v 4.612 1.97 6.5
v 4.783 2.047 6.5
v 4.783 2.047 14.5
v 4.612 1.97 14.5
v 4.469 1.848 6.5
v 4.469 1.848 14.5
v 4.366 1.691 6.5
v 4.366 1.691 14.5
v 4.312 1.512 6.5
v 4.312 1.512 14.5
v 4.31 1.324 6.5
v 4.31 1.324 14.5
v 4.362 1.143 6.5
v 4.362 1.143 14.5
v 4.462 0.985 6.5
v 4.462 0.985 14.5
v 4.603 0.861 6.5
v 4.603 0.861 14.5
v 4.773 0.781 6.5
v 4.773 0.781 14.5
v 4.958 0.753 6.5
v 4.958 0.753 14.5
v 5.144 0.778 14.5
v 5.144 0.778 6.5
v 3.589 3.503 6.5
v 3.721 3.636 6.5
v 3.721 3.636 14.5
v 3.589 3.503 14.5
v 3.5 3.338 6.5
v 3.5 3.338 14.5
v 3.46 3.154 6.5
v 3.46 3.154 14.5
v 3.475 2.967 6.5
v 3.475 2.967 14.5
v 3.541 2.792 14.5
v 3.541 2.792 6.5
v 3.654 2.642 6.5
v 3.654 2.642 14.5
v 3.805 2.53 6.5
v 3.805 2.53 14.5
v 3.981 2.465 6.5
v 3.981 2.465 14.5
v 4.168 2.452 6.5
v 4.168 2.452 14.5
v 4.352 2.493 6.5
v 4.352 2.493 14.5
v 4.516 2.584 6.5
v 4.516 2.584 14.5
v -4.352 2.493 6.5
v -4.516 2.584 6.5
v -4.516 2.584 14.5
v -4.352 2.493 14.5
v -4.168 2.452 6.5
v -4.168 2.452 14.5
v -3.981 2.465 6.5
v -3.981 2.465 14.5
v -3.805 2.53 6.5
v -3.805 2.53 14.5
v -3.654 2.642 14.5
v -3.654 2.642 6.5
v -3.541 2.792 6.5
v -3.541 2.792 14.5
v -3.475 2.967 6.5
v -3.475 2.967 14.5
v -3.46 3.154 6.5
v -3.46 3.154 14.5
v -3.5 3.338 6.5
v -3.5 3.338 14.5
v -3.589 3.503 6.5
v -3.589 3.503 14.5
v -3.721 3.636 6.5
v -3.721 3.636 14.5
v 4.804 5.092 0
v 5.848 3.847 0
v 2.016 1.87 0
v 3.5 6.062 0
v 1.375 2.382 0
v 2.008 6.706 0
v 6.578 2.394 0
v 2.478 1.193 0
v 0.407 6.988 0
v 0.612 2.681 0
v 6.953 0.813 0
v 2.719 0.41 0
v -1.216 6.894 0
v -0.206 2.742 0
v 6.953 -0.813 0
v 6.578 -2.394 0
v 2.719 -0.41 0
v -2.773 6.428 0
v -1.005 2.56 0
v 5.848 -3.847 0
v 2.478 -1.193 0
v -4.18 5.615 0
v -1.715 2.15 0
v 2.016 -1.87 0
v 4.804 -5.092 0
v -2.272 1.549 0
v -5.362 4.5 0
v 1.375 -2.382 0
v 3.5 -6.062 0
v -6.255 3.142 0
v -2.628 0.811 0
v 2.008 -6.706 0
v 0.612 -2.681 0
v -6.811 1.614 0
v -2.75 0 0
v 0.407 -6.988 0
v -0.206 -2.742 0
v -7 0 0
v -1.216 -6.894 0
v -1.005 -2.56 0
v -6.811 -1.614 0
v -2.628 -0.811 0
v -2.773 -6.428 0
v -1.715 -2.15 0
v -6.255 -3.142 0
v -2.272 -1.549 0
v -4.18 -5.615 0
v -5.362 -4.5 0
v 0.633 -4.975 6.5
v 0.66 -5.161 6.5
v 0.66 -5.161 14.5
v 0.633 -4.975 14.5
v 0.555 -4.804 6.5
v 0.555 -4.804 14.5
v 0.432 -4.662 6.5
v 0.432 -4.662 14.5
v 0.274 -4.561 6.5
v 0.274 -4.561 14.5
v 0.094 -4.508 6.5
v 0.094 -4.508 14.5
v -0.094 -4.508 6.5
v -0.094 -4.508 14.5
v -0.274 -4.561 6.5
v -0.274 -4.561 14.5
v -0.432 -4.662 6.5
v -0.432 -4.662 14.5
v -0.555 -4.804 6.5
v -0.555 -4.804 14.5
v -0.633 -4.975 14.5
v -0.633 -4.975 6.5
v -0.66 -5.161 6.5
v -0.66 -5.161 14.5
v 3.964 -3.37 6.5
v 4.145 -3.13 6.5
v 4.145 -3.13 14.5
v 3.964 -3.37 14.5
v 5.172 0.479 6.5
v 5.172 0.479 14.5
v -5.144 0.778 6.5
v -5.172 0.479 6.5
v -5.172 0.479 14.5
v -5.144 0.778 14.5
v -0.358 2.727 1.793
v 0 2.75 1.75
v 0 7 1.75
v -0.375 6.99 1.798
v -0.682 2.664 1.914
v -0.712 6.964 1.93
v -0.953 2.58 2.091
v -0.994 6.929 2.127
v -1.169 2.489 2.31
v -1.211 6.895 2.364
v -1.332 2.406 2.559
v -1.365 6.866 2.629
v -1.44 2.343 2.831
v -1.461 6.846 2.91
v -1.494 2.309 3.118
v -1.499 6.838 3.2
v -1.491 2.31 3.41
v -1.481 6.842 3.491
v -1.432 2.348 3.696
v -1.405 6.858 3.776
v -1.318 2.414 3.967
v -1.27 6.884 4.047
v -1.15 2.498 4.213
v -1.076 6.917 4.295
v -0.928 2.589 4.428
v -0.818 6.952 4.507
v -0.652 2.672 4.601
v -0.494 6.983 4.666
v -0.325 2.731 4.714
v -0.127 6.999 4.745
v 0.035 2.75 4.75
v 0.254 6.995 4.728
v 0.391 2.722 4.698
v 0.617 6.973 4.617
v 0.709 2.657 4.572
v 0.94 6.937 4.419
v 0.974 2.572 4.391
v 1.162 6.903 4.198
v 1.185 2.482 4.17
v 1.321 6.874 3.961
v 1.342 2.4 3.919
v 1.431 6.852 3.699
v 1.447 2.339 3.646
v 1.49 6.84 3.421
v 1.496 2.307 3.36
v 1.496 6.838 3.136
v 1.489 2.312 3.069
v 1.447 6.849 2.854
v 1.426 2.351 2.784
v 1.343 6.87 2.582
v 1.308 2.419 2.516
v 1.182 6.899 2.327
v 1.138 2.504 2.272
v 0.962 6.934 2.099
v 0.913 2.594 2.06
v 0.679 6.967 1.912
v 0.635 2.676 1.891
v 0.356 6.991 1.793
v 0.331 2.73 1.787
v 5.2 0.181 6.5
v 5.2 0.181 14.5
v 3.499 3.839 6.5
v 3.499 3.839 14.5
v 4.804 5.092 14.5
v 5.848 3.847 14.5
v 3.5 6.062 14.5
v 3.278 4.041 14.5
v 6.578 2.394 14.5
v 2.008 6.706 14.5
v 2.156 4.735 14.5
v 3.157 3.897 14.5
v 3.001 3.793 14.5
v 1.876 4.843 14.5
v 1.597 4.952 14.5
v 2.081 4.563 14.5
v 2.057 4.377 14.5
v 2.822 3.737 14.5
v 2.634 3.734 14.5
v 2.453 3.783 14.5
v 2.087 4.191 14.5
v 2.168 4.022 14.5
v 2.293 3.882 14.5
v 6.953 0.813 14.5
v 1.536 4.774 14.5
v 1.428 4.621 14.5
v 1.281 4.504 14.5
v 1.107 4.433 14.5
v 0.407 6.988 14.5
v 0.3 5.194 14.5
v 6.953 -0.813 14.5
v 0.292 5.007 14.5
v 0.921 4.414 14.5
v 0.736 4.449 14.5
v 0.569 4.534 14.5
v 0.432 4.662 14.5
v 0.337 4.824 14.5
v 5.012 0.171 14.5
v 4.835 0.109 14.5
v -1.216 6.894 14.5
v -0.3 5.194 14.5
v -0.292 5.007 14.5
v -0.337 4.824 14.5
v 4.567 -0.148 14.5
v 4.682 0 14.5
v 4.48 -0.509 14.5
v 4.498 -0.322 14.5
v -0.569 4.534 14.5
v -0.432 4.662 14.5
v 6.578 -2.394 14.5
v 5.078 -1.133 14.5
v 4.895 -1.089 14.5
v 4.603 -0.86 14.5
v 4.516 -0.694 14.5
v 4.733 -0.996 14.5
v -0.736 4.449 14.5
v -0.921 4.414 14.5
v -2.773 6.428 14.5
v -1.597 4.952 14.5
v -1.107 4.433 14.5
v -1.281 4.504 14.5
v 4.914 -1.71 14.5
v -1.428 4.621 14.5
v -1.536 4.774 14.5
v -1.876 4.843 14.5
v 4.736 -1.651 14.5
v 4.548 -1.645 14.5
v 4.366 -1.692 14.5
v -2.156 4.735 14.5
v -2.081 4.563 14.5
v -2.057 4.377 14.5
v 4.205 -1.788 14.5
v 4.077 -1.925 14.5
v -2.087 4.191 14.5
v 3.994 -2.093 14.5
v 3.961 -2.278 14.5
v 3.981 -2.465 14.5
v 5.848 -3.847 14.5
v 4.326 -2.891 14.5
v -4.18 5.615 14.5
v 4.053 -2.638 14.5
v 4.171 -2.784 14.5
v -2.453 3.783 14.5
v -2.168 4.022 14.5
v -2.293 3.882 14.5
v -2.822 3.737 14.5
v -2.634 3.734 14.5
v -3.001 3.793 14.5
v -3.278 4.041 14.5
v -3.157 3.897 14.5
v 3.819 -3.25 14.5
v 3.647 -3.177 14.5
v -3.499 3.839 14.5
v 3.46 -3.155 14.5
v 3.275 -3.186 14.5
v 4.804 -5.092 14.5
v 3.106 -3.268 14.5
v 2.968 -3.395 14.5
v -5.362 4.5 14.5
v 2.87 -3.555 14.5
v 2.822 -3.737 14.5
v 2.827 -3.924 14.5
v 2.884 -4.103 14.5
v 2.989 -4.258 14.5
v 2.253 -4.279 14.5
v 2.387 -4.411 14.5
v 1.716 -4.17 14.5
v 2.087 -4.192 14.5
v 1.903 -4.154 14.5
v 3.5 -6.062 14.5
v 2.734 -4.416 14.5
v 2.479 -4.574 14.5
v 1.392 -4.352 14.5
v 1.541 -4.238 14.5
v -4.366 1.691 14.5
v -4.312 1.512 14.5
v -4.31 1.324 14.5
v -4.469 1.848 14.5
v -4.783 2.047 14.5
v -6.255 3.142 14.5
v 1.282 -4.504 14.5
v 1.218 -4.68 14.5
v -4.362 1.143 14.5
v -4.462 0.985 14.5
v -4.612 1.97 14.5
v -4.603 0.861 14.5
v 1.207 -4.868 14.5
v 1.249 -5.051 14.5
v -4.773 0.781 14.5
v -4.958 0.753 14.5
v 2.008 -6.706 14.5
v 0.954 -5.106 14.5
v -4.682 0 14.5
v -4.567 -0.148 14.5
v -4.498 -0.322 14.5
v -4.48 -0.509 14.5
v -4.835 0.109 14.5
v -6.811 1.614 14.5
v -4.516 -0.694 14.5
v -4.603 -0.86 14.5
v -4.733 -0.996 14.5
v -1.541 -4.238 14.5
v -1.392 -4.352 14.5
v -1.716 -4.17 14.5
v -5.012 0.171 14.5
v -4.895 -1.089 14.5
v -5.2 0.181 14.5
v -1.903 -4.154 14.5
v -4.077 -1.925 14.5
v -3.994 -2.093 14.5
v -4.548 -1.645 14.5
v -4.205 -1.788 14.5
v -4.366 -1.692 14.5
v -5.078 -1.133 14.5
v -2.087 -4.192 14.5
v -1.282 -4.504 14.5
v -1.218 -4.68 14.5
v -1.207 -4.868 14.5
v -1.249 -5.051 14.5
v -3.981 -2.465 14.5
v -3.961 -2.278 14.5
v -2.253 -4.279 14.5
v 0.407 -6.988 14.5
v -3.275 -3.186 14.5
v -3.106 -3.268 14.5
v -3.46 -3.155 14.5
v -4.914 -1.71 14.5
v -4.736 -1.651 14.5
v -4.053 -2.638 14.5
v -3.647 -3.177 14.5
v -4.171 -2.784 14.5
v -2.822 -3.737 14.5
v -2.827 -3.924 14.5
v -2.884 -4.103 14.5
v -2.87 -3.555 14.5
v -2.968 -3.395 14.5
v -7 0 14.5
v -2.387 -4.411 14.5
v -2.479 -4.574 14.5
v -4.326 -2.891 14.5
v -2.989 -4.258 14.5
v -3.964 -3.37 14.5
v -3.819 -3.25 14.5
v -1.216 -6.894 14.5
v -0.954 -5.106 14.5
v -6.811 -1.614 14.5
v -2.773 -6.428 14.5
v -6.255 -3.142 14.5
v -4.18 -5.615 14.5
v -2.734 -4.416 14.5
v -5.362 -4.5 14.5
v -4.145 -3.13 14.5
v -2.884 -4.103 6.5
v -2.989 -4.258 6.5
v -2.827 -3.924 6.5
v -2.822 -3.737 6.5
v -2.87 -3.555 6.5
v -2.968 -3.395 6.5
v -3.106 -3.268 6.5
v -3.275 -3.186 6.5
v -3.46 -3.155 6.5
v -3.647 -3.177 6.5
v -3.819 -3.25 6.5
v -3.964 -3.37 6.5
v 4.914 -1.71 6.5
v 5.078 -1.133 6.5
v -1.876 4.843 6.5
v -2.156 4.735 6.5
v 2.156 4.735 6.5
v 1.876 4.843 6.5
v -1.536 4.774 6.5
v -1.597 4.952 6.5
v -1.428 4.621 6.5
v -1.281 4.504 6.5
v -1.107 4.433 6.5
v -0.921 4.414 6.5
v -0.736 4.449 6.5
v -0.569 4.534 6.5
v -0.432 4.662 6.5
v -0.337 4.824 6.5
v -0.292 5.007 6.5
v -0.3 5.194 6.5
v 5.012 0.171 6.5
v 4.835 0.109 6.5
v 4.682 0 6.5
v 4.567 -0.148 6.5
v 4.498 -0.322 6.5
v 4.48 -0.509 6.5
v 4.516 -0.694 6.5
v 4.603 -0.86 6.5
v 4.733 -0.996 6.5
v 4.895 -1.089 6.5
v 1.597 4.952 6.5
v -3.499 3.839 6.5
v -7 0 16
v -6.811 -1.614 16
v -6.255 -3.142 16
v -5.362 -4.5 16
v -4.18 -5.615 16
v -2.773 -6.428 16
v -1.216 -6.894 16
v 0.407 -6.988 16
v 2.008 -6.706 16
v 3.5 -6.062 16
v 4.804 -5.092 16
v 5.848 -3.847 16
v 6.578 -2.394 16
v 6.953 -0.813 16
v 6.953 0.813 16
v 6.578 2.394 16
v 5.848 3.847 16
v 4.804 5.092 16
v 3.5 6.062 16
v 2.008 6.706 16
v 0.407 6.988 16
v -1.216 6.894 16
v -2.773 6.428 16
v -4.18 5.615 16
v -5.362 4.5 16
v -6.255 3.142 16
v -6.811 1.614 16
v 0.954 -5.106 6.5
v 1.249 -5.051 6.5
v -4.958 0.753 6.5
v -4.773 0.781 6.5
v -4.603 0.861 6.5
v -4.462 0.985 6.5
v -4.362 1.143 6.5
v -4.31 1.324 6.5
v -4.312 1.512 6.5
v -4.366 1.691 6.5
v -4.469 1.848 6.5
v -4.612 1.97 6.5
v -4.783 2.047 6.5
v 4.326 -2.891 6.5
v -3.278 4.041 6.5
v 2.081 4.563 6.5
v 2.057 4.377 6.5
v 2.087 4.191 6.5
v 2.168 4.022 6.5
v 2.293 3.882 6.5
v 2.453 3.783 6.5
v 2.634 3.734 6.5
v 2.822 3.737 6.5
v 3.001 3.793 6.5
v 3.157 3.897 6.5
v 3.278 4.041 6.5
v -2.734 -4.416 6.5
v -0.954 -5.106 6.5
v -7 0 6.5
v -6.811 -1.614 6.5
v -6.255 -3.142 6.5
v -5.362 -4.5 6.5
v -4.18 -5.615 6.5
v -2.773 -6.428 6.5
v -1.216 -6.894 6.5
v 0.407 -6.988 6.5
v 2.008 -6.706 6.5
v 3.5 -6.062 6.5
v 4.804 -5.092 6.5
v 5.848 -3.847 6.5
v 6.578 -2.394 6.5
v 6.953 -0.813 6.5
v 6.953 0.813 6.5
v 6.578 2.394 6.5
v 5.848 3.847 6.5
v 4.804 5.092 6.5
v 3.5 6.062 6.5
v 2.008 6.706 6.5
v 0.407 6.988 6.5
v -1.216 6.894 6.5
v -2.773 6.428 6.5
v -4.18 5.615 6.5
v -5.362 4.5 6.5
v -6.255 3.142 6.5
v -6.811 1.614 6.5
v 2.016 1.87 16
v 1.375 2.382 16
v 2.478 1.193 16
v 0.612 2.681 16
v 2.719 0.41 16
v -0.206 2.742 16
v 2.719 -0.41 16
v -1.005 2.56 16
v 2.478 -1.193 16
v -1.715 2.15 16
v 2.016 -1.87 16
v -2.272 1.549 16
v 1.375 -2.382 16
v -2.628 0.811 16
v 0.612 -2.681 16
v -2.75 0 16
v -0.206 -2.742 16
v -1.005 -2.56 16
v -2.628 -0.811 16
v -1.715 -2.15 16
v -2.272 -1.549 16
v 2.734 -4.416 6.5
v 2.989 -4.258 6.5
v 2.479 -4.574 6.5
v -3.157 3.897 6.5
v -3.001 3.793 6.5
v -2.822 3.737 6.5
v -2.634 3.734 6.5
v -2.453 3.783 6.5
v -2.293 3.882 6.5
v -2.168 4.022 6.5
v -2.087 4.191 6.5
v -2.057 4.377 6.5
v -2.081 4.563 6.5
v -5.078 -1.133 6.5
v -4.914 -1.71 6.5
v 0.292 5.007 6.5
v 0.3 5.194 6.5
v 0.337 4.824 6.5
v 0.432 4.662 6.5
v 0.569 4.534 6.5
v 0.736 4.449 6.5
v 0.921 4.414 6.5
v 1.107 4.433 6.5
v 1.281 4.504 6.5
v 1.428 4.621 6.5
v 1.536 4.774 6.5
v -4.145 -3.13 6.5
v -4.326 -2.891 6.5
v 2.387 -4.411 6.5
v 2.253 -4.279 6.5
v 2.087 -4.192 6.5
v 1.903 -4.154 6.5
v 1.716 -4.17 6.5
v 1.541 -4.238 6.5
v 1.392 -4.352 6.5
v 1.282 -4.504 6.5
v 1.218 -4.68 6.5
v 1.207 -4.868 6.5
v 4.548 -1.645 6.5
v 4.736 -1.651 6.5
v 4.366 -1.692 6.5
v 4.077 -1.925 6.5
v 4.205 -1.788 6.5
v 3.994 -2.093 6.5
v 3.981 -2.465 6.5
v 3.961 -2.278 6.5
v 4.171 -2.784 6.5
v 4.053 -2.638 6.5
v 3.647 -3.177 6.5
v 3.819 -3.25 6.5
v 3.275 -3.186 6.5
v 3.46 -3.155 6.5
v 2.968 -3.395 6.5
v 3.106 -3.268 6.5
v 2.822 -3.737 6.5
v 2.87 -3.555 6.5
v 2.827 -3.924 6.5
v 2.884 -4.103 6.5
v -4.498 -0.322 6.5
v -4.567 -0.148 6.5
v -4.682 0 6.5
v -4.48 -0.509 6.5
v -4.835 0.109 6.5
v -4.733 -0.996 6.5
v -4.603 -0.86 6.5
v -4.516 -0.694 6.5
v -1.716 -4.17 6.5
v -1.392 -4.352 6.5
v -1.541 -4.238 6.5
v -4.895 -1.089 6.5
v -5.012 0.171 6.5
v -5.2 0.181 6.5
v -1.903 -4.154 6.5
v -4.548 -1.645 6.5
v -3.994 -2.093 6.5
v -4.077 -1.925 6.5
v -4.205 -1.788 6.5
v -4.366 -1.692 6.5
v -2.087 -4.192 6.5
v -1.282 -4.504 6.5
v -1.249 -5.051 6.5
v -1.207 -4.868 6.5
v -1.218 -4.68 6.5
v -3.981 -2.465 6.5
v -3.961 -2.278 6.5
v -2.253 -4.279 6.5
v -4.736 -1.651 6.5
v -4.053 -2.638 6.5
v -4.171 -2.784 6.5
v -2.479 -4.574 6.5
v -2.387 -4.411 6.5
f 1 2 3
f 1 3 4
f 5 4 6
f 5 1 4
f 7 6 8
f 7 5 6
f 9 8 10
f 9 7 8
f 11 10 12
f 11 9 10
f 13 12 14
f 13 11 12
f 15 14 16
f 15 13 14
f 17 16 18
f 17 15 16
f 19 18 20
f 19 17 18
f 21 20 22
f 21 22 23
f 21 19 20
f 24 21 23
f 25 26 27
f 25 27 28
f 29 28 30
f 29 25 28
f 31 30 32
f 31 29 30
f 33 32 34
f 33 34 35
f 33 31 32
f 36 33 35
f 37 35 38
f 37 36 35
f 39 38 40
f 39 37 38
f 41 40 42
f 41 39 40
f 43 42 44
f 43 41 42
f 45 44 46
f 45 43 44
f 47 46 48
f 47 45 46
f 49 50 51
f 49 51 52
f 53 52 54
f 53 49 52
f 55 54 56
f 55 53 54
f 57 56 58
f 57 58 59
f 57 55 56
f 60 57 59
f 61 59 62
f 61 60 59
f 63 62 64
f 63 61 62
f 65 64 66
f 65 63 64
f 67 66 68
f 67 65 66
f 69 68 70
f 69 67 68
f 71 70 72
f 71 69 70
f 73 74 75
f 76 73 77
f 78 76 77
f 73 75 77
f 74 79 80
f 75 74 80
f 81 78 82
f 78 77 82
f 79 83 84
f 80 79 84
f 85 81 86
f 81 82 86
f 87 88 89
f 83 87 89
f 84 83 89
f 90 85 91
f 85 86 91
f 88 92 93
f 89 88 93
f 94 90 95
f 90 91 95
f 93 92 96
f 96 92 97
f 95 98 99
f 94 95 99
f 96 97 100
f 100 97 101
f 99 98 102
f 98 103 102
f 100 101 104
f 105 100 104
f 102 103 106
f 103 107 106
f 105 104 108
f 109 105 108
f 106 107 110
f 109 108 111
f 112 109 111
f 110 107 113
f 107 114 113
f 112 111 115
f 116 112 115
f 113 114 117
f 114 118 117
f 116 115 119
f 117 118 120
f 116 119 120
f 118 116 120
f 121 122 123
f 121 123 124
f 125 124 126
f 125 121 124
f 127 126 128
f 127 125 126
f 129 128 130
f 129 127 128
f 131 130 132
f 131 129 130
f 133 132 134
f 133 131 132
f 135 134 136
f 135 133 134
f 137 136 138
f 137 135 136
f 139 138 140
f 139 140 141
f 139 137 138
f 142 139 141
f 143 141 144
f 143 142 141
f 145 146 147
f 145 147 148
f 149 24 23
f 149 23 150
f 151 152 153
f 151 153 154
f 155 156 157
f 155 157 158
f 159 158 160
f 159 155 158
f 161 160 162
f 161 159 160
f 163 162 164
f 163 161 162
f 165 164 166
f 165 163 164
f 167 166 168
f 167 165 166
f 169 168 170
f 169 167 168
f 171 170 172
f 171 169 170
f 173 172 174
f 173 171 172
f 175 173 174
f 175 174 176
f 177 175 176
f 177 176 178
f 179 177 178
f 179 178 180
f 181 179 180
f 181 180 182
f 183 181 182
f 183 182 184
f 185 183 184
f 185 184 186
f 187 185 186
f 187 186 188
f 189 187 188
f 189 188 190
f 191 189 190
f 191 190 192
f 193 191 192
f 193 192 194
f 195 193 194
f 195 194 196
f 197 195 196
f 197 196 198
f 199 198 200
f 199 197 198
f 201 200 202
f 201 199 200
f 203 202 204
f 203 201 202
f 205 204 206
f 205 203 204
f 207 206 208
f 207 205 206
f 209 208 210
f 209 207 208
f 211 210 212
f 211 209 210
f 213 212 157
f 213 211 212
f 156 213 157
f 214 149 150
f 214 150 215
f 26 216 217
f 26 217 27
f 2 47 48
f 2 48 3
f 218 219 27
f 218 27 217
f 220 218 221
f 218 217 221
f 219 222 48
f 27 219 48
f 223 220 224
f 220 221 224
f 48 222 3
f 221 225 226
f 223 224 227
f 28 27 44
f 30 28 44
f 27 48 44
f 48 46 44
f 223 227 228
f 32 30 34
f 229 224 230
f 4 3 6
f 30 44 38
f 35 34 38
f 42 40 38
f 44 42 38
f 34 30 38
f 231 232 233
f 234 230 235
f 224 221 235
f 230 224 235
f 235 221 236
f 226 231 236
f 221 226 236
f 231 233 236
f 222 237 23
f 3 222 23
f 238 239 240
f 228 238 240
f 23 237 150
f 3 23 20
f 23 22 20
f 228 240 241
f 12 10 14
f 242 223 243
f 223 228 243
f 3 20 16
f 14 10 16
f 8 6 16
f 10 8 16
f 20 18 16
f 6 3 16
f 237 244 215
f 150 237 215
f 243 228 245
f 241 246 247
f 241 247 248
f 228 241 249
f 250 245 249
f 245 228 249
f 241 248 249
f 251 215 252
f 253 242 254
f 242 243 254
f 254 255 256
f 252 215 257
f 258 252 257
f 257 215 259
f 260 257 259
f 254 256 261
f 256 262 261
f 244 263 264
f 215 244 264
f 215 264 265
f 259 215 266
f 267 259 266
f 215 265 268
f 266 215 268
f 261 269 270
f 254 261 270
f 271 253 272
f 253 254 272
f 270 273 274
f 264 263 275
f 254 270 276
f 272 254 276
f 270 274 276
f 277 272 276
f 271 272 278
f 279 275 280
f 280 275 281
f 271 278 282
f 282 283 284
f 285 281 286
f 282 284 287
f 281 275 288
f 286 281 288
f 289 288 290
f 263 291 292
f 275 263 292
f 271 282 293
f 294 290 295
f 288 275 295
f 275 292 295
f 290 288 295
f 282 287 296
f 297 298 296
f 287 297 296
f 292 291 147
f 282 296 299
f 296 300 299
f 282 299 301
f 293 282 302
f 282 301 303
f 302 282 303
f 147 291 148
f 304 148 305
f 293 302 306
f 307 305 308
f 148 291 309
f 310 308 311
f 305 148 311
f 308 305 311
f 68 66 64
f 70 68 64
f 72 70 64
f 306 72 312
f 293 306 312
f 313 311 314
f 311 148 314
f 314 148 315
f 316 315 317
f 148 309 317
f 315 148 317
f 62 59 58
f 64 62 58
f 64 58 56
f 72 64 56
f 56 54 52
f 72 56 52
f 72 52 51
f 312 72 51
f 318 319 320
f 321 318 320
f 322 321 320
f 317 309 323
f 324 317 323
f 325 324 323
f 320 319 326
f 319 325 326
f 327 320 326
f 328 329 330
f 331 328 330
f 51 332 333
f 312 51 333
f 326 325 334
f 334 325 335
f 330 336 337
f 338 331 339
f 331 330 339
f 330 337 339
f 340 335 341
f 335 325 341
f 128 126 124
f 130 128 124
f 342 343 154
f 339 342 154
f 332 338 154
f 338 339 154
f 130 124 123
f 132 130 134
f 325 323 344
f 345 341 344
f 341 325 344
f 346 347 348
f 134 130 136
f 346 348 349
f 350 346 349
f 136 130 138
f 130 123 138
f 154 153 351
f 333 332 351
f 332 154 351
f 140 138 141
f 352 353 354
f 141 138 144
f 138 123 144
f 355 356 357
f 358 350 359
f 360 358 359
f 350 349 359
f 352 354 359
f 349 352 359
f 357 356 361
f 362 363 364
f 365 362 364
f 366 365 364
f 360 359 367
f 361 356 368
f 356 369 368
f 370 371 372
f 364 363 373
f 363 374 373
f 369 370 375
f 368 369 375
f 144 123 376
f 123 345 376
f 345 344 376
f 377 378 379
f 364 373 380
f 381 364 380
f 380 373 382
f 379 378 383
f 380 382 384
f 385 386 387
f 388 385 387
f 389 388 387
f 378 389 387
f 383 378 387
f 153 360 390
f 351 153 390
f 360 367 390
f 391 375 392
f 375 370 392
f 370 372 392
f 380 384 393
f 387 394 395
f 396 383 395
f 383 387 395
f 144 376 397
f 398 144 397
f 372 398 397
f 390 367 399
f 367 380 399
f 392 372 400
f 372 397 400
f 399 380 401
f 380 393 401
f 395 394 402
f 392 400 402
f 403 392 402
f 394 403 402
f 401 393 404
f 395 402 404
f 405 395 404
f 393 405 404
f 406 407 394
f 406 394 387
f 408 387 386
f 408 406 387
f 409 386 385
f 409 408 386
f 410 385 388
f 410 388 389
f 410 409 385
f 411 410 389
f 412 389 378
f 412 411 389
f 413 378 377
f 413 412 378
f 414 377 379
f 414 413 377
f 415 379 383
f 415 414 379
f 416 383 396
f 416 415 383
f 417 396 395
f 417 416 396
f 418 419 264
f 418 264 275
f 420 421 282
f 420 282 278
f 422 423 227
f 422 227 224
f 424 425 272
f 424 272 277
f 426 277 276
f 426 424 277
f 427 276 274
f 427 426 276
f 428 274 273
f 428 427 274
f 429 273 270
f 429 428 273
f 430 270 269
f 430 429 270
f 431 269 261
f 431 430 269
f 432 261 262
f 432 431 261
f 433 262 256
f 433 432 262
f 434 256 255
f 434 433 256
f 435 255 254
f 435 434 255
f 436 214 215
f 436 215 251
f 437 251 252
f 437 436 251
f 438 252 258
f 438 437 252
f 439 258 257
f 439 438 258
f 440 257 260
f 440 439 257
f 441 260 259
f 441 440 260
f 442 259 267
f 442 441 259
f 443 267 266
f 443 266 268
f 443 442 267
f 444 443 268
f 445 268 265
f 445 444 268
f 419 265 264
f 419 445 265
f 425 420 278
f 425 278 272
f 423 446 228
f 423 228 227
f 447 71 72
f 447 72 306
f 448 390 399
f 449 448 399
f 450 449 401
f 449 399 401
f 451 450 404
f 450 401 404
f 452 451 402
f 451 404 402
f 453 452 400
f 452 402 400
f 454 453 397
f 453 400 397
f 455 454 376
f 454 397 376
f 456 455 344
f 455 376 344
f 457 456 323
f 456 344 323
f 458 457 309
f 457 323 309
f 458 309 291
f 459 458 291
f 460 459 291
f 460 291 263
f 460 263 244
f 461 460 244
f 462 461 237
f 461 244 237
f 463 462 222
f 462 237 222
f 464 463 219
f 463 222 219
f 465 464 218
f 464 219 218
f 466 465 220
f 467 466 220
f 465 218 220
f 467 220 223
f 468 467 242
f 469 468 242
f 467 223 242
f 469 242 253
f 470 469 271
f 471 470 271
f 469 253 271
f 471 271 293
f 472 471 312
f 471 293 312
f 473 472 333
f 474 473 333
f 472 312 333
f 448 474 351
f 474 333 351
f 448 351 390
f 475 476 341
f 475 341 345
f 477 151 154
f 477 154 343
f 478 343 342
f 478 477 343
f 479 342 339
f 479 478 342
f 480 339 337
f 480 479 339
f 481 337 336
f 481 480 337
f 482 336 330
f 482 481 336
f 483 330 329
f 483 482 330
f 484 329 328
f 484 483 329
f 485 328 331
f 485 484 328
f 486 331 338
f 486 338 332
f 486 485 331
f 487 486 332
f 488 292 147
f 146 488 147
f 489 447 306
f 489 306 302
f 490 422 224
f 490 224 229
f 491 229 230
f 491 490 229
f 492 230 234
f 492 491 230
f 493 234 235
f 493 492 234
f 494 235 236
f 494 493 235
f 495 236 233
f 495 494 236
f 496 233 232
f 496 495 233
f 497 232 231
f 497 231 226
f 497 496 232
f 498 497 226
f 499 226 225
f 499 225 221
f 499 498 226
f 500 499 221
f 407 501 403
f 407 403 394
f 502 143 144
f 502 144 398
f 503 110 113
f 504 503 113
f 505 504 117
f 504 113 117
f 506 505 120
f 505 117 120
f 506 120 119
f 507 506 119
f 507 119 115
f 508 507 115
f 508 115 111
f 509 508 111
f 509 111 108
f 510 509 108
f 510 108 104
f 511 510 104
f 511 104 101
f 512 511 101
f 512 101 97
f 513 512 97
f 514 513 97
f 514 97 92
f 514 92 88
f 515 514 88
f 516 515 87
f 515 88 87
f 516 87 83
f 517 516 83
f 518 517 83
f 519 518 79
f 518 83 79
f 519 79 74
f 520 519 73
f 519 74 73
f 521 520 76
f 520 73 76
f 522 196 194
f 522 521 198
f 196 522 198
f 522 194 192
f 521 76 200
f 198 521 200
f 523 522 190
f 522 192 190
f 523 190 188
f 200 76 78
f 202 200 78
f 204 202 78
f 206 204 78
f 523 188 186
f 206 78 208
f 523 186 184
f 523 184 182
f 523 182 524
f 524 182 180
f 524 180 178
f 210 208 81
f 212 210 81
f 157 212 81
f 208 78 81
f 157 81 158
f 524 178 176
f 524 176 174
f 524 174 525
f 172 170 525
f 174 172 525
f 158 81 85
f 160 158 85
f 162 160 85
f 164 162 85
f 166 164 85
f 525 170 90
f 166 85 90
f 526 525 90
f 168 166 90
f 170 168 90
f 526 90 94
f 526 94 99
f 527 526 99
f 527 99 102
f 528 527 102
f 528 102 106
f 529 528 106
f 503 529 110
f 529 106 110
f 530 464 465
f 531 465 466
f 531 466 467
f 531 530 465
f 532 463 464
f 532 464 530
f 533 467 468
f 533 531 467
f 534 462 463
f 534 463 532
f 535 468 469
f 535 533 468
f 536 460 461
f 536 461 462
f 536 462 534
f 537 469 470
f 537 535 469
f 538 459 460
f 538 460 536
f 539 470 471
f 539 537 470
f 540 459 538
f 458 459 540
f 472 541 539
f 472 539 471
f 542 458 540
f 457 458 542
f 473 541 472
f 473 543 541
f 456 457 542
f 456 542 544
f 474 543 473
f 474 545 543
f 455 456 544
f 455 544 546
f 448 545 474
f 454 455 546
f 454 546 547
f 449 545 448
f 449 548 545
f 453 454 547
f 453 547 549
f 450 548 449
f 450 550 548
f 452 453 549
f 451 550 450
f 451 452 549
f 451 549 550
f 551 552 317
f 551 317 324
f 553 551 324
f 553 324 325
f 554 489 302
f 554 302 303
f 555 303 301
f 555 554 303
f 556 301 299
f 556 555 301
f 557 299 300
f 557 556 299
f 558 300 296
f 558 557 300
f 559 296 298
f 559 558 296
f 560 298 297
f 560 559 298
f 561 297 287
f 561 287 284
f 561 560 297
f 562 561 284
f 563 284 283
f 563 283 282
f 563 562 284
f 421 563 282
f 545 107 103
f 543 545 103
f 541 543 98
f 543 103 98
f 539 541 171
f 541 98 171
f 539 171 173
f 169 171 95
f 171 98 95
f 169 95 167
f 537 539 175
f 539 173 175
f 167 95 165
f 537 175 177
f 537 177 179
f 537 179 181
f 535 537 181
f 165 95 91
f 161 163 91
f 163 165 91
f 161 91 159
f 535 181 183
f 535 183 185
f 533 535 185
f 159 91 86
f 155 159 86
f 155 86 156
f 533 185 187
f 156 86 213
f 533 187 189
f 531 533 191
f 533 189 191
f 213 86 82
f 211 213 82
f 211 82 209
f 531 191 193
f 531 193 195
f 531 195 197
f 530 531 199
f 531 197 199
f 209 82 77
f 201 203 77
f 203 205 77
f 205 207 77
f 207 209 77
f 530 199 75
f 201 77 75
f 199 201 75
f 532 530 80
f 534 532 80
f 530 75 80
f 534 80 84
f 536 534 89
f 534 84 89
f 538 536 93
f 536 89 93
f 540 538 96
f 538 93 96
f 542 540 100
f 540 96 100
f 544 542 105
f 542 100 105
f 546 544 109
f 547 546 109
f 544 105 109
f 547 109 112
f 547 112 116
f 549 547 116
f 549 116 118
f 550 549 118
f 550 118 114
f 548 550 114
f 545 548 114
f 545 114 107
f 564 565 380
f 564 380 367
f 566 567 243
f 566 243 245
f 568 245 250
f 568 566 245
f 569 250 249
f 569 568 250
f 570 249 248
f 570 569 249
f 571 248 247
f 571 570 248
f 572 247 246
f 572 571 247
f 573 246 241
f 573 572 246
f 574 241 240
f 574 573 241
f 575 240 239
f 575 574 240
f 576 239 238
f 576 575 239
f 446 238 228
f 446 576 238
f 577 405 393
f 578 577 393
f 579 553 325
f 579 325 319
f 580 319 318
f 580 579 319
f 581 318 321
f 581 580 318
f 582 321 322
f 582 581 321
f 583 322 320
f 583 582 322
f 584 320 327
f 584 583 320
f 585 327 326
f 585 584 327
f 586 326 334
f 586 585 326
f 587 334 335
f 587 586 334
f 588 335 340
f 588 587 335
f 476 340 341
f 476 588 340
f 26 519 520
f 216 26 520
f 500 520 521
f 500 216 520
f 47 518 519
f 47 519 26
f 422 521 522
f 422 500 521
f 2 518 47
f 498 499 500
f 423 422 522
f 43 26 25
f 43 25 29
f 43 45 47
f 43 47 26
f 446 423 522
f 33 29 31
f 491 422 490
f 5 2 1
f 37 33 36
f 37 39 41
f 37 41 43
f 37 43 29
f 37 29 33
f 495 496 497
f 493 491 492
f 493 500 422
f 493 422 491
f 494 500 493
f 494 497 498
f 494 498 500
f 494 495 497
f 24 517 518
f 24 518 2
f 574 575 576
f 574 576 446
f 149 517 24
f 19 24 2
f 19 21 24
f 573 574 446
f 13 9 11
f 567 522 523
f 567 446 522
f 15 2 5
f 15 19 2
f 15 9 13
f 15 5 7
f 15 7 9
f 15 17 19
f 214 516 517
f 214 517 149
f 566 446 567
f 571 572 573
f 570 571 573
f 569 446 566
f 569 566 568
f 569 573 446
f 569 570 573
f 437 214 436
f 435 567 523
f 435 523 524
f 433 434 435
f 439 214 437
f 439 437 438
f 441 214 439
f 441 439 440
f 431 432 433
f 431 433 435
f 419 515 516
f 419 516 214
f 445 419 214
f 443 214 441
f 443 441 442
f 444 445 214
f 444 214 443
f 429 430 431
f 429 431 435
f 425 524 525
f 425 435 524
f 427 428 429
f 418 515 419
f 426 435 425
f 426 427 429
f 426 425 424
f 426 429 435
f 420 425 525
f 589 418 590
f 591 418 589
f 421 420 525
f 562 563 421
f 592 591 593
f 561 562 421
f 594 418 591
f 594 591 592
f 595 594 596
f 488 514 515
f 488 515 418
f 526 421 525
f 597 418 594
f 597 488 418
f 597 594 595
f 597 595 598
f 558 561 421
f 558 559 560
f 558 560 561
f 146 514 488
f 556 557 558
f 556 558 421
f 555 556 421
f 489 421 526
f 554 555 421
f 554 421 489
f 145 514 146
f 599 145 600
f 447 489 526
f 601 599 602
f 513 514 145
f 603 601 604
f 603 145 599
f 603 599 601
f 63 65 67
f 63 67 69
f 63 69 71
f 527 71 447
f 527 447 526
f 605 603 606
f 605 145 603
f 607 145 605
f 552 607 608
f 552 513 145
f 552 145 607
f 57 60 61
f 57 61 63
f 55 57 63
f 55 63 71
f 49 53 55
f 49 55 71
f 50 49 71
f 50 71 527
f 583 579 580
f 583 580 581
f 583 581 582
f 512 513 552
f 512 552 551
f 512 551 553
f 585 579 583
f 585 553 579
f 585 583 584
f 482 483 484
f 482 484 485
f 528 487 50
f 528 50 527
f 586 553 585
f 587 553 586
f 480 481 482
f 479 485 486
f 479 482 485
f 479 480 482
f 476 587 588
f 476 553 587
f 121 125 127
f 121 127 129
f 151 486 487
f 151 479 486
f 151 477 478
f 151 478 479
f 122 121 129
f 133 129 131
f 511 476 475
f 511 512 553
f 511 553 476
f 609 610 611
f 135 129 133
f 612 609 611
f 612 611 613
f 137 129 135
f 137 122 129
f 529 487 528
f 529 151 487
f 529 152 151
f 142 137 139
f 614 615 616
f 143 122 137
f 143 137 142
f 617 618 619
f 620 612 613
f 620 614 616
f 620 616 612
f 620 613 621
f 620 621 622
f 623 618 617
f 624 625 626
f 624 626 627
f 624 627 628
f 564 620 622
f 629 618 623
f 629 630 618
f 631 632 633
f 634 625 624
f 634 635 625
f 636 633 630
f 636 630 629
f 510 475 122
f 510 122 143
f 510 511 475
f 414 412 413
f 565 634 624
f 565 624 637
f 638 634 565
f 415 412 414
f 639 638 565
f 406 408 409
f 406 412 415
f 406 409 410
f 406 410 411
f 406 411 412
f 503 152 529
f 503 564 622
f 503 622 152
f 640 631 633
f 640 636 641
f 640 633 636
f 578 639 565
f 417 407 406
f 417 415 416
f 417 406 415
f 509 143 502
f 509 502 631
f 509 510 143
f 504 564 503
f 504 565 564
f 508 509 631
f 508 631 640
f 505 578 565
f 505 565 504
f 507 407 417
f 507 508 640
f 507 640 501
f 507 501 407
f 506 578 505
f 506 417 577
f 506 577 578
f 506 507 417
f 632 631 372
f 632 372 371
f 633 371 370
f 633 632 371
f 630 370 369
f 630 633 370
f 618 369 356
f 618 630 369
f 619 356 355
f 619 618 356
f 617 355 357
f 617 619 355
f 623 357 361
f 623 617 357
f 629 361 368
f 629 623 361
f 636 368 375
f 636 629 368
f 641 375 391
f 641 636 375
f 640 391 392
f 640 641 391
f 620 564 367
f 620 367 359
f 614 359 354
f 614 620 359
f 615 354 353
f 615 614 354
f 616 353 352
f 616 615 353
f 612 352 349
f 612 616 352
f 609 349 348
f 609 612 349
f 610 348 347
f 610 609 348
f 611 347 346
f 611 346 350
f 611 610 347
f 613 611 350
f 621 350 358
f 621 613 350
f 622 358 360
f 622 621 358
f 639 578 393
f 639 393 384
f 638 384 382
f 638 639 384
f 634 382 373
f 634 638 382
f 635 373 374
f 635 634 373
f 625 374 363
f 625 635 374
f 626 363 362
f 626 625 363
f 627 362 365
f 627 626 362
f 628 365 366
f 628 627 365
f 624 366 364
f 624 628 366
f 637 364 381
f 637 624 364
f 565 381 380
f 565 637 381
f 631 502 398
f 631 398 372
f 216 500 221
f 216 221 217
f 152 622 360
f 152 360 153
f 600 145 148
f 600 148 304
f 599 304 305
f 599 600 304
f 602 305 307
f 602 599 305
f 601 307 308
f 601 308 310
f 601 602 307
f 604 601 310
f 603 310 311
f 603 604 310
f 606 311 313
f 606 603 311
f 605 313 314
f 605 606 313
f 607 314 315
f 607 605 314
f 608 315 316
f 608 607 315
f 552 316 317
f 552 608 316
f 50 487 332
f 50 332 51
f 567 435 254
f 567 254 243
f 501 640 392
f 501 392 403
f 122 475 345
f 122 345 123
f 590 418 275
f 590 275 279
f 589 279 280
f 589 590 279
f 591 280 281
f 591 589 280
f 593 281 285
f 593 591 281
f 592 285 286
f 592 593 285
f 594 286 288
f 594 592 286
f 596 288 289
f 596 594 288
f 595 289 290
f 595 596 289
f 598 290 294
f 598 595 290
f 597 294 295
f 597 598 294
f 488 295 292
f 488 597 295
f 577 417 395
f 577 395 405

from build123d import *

# Parameters (mm, degrees)
ESQUISSE1_R                  = 7
BOSS_EXTRU_1_DEPTH           = 6.5
BOSS_EXTRU_2_DEPTH           = 8
ESQUISSE4_R                  = 7
BOSS_EXTRU_3_DEPTH           = 1.5
ESQUISSE5_R                  = 2.75
ENL_V_MAT_EXTRU_1_DEPTH      = 16
ENL_V_MAT_EXTRU_3_REACH      = 20.815
ENL_V_MAT_EXTRU_3_END_RADIUS = 7
ESQUISSE8_R                  = 1.5


with BuildPart() as part:
    # Esquisse1 → Boss.-Extru.1 (new body)
    with BuildSketch(Plane.XY):
        with Locations(Location((0, 0, 0), (0, 0, 180))):
            Circle(ESQUISSE1_R)
    extrude(amount=BOSS_EXTRU_1_DEPTH)

    # Esquisse3 → Boss.-Extru.2 (add)
    with BuildSketch(Plane.XY.offset(6.5)):
        with BuildLine():
            Line((0, 5.194220739), (0.3, 5.194220739))
            ThreePointArc((0.3, 5.194220739), (0.827122819, 4.424716273), (1.596627286, 4.951839093))
            Line((1.596627286, 4.951839093), (1.876368954, 4.843466593))
            Line((1.876368954, 4.843466593), (2.156110623, 4.735094093))
            ThreePointArc((2.156110623, 4.735094093), (2.369660938, 3.827133822), (3.277621209, 4.040684138))
            Line((3.277621209, 4.040684138), (3.499323884, 3.838575444))
            Line((3.499323884, 3.838575444), (3.721026559, 3.636466751))
            ThreePointArc((3.721026559, 3.636466751), (3.592163217, 2.712675742), (4.515954226, 2.583812399))
            Line((4.515954226, 2.583812399), (4.649675733, 2.315263412))
            Line((4.649675733, 2.315263412), (4.78339724, 2.046714425))
            ThreePointArc((4.78339724, 2.046714425), (4.329523948, 1.231855771), (5.144382602, 0.777982479))
            Line((5.144382602, 0.777982479), (5.172063109, 0.479262226))
            Line((5.172063109, 0.479262226), (5.199743617, 0.180541973))
            ThreePointArc((5.199743617, 0.180541973), (4.482158479, -0.415333148), (5.0780336, -1.132918286))
            Line((5.0780336, -1.132918286), (4.995934703, -1.421465979))
            Line((4.995934703, -1.421465979), (4.913835806, -1.710013672))
            ThreePointArc((4.913835806, -1.710013672), (4.029452671, -2.006429023), (4.325868023, -2.890812158))
            Line((4.325868023, -2.890812158), (4.145077632, -3.130217327))
            Line((4.145077632, -3.130217327), (3.964287241, -3.369622495))
            ThreePointArc((3.964287241, -3.369622495), (3.032546952, -3.326545541), (2.989469999, -4.258285831))
            Line((2.989469999, -4.258285831), (2.734404858, -4.416215479))
            Line((2.734404858, -4.416215479), (2.479339718, -4.574145128))
            ThreePointArc((2.479339718, -4.574145128), (1.626078963, -4.197393651), (1.249327486, -5.050654405))
            Line((1.249327486, -5.050654405), (0.954435556, -5.105779261))
            Line((0.954435556, -5.105779261), (0.659543626, -5.160904116))
            ThreePointArc((0.659543626, -5.160904116), (0, -4.50136049), (-0.659543626, -5.160904116))
            Line((-0.659543626, -5.160904116), (-0.954435556, -5.105779261))
            Line((-0.954435556, -5.105779261), (-1.249327486, -5.050654405))
            ThreePointArc((-1.249327486, -5.050654405), (-1.626078963, -4.197393651), (-2.479339718, -4.574145128))
            Line((-2.479339718, -4.574145128), (-2.734404858, -4.416215479))
            Line((-2.734404858, -4.416215479), (-2.989469999, -4.258285831))
            ThreePointArc((-2.989469999, -4.258285831), (-3.032546952, -3.326545541), (-3.964287241, -3.369622495))
            Line((-3.964287241, -3.369622495), (-4.145077632, -3.130217327))
            Line((-4.145077632, -3.130217327), (-4.325868023, -2.890812158))
            ThreePointArc((-4.325868023, -2.890812158), (-4.029452671, -2.006429023), (-4.913835806, -1.710013672))
            Line((-4.913835806, -1.710013672), (-4.995934703, -1.421465979))
            Line((-4.995934703, -1.421465979), (-5.0780336, -1.132918286))
            ThreePointArc((-5.0780336, -1.132918286), (-4.482158479, -0.415333148), (-5.199743617, 0.180541973))
            Line((-5.199743617, 0.180541973), (-5.172063109, 0.479262226))
            Line((-5.172063109, 0.479262226), (-5.144382602, 0.777982479))
            ThreePointArc((-5.144382602, 0.777982479), (-4.329523948, 1.231855771), (-4.78339724, 2.046714425))
            Line((-4.78339724, 2.046714425), (-4.649675733, 2.315263412))
            Line((-4.649675733, 2.315263412), (-4.515954226, 2.583812399))
            ThreePointArc((-4.515954226, 2.583812399), (-3.592163217, 2.712675742), (-3.721026559, 3.636466751))
            Line((-3.721026559, 3.636466751), (-3.499323884, 3.838575444))
            Line((-3.499323884, 3.838575444), (-3.277621209, 4.040684138))
            ThreePointArc((-3.277621209, 4.040684138), (-2.369660938, 3.827133822), (-2.156110623, 4.735094093))
            Line((-2.156110623, 4.735094093), (-1.876368954, 4.843466593))
            Line((-1.876368954, 4.843466593), (-1.596627286, 4.951839093))
            ThreePointArc((-1.596627286, 4.951839093), (-0.827122819, 4.424716273), (-0.3, 5.194220739))
            Line((-0.3, 5.194220739), (0, 5.194220739))
        make_face()
    extrude(amount=BOSS_EXTRU_2_DEPTH)

    # Esquisse4 → Boss.-Extru.3 (add)
    with BuildSketch(Plane.XY.offset(14.5)):
        with Locations(Location((0, 0, 0), (0, 0, 180))):
            Circle(ESQUISSE4_R)
    extrude(amount=BOSS_EXTRU_3_DEPTH)

    # Esquisse5 → Enlèv. mat.-Extru.1 (cut)
    with BuildSketch(Plane(origin=(0, 0, 0), x_dir=(-1, 0, 0), z_dir=(0, 0, -1))):
        Circle(ESQUISSE5_R)
    extrude(amount=-ENL_V_MAT_EXTRU_1_DEPTH, mode=Mode.SUBTRACT)

    # Enlèv. mat.-Extru.3: up to this cylinder (the profile starts inside it)
    enl_v_mat_extru_3_end = Plane(origin=(0, 0, 3.25), z_dir=(0, 0, -1)) * Cylinder(ENL_V_MAT_EXTRU_3_END_RADIUS, 56.63, mode=Mode.PRIVATE)
    # Esquisse8 → Enlèv. mat.-Extru.3 (cut, up to the surface)
    with BuildSketch(Plane(origin=(0, 0, 0), x_dir=(1, 0, 0), z_dir=(0, 1, 0)), mode=Mode.PRIVATE) as enl_v_mat_extru_3_sk1:
        with Locations(Location((0, -3.25, 0), (0, 0, 90))):
            Circle(ESQUISSE8_R)
    enl_v_mat_extru_3_tool1 = extrude(enl_v_mat_extru_3_sk1.sketch, amount=ENL_V_MAT_EXTRU_3_REACH, mode=Mode.PRIVATE) & enl_v_mat_extru_3_end
    add(enl_v_mat_extru_3_tool1.solids().sort_by_distance((0, 0, 3.25))[0], mode=Mode.SUBTRACT)


solid = part.part
